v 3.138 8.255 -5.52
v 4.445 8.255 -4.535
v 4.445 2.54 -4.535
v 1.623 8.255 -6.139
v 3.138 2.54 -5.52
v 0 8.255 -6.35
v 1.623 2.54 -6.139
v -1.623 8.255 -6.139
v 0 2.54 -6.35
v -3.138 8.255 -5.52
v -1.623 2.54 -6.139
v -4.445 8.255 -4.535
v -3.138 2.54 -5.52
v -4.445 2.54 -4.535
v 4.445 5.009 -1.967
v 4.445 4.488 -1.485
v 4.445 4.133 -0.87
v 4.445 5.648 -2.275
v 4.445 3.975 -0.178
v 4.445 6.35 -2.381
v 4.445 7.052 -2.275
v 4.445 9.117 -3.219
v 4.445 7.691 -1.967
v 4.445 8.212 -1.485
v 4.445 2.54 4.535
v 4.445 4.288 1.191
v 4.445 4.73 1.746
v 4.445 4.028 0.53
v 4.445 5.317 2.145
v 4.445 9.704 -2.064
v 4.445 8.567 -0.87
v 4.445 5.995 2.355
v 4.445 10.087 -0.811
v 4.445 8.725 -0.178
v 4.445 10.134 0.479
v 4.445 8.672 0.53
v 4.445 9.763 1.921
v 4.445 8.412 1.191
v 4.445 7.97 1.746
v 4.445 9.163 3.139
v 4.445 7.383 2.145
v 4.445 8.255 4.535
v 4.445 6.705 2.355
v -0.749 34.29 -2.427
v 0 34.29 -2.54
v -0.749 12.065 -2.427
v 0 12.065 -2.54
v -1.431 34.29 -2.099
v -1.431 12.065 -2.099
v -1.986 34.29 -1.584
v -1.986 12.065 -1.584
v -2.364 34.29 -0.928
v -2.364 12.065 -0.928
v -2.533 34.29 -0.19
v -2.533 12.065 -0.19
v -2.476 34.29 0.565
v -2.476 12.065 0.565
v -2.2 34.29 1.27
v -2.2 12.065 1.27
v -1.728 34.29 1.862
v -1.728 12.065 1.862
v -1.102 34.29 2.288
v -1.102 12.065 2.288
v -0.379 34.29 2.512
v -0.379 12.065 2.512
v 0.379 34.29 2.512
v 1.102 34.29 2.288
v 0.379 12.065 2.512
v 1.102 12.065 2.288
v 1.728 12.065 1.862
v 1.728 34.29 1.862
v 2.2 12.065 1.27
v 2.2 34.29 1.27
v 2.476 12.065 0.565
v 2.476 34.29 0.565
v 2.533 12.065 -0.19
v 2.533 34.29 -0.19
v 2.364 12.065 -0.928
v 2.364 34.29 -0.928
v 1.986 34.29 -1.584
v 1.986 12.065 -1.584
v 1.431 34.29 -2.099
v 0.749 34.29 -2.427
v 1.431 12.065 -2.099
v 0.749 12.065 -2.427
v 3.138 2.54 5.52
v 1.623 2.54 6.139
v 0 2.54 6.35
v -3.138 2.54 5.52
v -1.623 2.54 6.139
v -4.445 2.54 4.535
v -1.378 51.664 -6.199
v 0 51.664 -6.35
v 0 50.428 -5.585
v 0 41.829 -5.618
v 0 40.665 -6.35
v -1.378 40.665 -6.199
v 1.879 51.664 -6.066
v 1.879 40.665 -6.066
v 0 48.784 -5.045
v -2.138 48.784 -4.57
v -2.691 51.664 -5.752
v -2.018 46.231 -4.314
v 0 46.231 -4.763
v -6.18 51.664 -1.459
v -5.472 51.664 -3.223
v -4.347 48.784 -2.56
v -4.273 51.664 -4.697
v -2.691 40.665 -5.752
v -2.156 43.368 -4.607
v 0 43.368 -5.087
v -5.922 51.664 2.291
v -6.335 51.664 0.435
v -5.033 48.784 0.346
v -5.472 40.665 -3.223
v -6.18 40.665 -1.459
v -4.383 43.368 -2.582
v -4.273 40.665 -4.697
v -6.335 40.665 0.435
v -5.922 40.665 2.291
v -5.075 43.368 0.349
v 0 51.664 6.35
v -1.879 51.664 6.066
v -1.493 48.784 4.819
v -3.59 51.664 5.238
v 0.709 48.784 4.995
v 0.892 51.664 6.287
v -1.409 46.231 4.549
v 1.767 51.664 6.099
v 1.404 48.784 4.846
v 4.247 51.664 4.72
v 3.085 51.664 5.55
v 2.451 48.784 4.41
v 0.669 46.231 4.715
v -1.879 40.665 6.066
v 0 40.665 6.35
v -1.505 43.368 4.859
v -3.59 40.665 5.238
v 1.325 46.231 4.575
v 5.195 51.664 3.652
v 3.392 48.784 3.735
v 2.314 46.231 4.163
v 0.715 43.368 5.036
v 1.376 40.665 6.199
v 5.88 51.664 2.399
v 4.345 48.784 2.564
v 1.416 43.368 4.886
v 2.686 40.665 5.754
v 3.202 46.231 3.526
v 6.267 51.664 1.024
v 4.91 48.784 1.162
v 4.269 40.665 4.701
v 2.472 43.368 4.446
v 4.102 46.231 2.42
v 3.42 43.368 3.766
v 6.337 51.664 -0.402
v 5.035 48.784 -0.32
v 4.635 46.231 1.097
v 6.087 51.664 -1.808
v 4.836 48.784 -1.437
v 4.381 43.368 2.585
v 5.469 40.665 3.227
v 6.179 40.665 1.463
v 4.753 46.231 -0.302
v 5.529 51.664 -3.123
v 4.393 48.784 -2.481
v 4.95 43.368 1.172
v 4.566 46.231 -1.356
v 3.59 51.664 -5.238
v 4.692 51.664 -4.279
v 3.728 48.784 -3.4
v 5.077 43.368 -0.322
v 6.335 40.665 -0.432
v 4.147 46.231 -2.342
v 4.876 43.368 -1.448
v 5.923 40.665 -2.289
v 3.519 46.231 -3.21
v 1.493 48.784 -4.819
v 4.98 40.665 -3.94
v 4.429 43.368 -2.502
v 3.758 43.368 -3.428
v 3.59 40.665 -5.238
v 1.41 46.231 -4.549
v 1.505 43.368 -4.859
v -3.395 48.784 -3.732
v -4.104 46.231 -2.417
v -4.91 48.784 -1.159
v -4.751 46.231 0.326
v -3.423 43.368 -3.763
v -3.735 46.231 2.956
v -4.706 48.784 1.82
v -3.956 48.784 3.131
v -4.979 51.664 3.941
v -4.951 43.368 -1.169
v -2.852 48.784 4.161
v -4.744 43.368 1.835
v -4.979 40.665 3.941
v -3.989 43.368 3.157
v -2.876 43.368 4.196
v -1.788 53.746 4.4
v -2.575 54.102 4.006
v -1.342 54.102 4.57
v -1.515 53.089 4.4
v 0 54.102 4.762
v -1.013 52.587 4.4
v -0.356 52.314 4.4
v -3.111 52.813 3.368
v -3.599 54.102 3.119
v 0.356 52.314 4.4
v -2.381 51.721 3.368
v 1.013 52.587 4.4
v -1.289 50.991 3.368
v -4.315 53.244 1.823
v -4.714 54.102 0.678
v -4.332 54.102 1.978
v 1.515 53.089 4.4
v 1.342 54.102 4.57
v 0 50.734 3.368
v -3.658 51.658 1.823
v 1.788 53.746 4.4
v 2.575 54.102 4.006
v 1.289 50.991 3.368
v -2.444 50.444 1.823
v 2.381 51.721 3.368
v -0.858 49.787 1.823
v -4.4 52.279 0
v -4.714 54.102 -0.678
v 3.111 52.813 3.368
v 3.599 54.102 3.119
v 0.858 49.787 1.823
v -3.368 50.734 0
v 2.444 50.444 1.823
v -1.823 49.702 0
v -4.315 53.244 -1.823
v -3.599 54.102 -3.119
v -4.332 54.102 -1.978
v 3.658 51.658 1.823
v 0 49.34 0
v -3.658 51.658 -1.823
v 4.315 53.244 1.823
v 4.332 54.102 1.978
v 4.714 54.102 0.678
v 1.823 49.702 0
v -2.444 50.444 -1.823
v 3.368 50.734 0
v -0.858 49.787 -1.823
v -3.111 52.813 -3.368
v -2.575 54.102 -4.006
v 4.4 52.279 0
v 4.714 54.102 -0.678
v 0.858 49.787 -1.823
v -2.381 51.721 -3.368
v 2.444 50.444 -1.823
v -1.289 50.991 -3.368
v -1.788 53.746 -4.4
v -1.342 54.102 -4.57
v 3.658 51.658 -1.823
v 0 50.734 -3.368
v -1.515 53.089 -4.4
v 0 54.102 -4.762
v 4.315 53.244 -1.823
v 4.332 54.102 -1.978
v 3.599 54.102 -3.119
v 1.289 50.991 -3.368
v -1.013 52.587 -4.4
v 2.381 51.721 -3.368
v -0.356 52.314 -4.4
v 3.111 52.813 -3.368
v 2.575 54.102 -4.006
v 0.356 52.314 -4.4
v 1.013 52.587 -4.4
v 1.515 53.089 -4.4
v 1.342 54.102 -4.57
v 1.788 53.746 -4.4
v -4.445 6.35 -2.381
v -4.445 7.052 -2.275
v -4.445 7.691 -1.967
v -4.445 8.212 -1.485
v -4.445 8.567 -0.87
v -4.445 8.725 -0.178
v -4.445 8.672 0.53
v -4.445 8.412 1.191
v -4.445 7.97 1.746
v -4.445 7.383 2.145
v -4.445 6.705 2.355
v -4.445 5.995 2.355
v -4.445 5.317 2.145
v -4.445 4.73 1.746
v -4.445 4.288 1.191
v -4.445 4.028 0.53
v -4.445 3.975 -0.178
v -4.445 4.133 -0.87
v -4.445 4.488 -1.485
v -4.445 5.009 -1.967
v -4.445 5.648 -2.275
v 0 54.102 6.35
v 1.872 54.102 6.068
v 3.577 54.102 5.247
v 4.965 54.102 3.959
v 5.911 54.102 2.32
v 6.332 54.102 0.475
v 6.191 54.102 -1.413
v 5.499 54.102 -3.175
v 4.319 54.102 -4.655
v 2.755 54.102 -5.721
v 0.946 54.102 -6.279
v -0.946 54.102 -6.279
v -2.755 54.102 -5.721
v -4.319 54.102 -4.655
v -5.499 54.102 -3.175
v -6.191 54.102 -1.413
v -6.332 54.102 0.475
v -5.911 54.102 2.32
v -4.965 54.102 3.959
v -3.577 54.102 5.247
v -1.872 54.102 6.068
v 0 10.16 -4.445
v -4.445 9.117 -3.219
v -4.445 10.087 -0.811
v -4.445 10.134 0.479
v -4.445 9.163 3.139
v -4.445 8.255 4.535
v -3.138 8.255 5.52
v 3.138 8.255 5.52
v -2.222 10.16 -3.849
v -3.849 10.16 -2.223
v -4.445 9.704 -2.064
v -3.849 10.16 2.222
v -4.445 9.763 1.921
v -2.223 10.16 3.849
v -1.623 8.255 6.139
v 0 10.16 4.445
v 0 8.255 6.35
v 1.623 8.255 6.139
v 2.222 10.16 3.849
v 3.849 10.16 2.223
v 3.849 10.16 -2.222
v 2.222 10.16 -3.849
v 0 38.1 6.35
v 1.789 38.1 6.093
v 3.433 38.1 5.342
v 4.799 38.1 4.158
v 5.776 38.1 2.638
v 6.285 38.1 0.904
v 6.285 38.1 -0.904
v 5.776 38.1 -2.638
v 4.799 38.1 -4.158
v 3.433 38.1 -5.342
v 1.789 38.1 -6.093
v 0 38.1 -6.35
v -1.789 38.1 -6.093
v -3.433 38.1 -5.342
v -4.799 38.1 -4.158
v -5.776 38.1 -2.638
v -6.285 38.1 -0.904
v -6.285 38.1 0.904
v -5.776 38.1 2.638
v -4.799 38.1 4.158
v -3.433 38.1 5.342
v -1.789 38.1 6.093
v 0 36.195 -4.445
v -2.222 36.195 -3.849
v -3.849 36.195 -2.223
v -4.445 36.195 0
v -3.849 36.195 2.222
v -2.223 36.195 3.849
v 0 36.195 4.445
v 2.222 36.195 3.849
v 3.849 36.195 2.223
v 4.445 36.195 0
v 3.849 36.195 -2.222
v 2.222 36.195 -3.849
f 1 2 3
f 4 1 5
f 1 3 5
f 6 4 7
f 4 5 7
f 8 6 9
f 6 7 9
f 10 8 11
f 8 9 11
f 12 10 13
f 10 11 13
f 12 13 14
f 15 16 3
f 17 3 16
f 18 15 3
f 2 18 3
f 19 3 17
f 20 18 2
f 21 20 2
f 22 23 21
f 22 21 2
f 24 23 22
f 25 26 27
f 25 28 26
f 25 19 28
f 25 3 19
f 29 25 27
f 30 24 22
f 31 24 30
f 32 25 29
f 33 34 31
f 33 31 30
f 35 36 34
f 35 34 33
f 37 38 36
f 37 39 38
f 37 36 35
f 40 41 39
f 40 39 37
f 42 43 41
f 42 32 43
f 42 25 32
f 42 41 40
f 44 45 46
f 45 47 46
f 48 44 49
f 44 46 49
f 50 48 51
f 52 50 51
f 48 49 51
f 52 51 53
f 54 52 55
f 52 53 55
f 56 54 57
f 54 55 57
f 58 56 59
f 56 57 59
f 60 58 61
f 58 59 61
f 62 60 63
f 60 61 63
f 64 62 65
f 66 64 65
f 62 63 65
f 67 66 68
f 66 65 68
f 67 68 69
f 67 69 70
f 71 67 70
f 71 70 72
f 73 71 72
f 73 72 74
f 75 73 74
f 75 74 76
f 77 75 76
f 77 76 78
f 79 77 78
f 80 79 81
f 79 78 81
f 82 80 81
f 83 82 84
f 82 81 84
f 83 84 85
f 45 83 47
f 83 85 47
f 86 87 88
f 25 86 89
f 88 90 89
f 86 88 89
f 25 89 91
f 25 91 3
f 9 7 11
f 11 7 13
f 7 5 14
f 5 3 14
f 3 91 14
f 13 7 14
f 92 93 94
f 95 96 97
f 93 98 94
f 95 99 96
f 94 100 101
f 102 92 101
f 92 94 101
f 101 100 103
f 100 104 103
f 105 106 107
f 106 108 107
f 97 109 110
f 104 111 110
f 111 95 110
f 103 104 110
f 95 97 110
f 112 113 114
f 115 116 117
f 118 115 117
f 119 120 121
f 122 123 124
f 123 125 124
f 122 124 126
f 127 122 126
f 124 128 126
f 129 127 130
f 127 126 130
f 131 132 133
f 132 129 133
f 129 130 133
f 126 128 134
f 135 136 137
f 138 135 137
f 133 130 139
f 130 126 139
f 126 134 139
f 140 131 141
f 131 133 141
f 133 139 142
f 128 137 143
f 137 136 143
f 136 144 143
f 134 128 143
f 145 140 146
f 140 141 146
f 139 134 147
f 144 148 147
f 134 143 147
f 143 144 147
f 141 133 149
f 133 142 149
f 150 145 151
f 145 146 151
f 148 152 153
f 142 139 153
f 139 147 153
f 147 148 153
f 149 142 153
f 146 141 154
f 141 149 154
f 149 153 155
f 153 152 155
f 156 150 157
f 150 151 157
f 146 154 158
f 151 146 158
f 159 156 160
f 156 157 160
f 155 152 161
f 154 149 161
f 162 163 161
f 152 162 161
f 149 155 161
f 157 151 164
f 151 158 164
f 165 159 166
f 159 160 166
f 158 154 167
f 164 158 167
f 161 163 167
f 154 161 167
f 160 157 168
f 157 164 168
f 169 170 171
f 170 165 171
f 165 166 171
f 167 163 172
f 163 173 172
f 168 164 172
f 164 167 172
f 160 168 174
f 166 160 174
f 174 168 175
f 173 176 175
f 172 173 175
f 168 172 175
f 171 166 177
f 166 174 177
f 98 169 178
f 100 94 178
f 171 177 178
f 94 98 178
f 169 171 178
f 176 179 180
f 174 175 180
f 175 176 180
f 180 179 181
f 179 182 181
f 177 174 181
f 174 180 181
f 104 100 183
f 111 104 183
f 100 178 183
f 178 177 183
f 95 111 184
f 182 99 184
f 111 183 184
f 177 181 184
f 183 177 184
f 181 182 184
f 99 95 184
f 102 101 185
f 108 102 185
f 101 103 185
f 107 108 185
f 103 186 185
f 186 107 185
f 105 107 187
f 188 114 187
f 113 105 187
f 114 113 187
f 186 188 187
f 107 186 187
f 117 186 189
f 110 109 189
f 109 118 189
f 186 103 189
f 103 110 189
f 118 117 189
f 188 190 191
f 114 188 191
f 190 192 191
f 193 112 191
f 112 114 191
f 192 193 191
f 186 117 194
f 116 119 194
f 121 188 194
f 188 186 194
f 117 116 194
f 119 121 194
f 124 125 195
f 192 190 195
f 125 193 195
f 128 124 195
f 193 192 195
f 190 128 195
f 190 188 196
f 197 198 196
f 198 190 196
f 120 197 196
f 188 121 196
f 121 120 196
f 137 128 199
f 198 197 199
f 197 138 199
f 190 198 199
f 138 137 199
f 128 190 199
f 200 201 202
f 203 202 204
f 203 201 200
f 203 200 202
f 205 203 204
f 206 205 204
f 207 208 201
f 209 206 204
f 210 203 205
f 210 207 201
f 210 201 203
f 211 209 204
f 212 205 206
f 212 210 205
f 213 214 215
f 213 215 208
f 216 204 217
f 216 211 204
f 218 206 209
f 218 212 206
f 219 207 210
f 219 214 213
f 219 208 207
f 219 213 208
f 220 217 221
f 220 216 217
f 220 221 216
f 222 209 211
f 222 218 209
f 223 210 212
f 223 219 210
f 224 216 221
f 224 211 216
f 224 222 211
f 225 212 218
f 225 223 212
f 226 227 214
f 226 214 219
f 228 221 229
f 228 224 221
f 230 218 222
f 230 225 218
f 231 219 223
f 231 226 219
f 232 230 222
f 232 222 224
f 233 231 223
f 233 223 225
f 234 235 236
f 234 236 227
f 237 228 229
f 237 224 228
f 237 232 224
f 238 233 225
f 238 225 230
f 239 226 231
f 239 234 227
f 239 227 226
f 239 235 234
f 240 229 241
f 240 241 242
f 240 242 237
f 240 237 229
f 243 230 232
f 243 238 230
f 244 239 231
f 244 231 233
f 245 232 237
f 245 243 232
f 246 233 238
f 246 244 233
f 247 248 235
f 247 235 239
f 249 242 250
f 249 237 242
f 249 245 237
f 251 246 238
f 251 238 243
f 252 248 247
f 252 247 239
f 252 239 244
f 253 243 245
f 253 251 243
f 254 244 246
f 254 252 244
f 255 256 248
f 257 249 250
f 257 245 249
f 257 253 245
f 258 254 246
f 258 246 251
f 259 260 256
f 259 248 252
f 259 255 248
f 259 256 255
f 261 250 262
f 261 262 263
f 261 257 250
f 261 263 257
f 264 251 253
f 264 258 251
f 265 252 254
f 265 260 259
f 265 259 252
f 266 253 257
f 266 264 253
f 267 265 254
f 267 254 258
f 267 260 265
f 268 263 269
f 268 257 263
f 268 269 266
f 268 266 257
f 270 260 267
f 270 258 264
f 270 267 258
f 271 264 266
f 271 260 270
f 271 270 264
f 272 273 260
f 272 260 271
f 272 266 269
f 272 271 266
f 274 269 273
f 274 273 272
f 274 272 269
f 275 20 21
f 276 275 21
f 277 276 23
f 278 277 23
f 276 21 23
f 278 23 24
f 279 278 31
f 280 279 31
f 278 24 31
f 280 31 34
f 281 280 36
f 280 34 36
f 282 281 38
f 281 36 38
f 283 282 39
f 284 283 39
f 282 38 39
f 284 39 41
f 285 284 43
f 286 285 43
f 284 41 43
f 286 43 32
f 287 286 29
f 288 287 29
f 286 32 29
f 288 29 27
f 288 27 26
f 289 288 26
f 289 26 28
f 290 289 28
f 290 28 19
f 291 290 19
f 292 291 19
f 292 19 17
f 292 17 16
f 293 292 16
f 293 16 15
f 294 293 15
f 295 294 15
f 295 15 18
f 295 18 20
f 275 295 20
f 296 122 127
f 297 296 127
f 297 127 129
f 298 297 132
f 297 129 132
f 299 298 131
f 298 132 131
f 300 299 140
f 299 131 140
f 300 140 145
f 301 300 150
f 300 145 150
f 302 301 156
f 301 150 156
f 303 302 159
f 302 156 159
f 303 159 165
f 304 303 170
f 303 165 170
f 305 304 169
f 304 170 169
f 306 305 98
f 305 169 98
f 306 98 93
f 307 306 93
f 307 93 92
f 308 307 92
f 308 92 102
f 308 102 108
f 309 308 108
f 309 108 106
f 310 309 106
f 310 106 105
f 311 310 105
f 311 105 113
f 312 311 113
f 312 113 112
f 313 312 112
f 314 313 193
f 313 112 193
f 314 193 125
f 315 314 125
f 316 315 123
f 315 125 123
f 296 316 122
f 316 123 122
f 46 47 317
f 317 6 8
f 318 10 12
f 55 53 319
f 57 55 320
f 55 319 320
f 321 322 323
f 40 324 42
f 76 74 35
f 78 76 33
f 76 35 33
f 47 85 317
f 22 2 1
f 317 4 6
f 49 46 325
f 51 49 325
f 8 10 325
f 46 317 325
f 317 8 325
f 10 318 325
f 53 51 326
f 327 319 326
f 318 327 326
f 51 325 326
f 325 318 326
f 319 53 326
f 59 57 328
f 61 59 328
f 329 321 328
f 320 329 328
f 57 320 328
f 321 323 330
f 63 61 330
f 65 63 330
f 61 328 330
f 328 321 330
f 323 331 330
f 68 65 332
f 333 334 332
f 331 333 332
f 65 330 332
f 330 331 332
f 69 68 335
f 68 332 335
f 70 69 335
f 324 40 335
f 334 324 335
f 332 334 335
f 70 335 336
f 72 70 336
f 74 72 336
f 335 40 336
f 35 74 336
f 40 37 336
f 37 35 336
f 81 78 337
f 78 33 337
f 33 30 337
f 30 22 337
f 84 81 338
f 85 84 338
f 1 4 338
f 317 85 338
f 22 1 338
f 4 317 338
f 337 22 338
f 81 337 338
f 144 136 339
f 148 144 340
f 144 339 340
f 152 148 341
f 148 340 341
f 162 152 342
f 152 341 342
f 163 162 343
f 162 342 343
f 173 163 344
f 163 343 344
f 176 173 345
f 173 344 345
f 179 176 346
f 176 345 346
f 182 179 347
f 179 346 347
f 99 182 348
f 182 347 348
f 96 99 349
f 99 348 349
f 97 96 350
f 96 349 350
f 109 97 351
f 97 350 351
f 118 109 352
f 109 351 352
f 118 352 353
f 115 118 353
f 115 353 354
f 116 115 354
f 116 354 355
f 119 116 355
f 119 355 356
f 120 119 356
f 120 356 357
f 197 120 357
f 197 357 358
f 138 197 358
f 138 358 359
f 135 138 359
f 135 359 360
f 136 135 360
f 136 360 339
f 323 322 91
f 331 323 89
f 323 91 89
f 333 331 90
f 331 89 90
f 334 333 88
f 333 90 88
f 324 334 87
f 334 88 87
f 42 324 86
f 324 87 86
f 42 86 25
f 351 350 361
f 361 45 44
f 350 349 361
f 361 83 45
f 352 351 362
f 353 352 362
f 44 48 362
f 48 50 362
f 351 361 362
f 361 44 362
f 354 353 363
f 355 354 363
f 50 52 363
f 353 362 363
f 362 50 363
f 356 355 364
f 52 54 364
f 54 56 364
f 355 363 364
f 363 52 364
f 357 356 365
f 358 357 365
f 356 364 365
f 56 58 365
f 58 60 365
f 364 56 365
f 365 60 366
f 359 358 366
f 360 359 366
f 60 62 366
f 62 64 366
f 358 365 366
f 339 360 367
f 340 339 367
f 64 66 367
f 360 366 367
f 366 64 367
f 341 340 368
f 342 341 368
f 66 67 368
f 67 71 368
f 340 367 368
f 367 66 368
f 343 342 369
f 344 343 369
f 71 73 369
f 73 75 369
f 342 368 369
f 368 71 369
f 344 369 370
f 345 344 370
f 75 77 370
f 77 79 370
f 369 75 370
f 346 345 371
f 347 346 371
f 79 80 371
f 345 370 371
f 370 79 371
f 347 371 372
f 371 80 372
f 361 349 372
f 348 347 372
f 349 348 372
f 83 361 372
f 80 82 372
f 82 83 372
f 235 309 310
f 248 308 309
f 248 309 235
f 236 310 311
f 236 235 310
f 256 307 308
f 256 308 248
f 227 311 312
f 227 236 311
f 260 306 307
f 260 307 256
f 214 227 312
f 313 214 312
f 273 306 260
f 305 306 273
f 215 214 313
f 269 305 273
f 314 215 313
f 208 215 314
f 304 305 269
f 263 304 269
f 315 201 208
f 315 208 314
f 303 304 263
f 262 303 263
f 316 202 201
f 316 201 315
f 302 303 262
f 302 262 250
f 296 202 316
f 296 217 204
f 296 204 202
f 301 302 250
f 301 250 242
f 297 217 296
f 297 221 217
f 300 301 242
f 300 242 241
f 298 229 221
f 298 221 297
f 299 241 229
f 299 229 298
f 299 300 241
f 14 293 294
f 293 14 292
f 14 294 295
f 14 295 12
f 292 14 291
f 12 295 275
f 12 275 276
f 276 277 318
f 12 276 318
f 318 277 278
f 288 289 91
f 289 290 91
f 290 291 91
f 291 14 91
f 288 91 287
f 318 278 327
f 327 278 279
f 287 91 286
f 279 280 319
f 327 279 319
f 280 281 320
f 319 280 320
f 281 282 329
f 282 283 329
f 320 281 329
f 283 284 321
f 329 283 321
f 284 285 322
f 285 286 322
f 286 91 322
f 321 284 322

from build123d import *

# Parameters (mm, degrees)
SKETCH1_R                      = 6.35
BOSS_EXTRUDE1_DEPTH            = 54.102
SKETCH3_W                      = 6.35
SKETCH3_H                      = 14.605
CUT_EXTRUDE1_DEPTH             = 55.842241056
F_3_16_0_1875_DIAMETER_HOLE1_D = 4.7625
SKETCH7_RX                     = 6.35
SKETCH7_RY                     = 3.175
CUT_EXTRUDE2_DEPTH             = 56.532701566
CUT_EXTRUDE2_DEPTH_BACK        = 56.532701566
SKETCH9_W                      = 25.4
SKETCH9_H                      = 12.7


with BuildPart() as part:
    # Sketch1 → Boss-Extrude1 (new body)
    with BuildSketch(Plane(origin=(0, 0, 0), x_dir=(1, 0, 0), z_dir=(0, 1, 0))):
        with Locations(Location((0, 0, 0), (0, 0, 270))):
            Circle(SKETCH1_R)
    extrude(amount=BOSS_EXTRUDE1_DEPTH)

    # Sketch2 → Cut-Revolve1 (revolve, cut)
    with BuildSketch(Plane.XY, mode=Mode.PRIVATE) as cut_revolve1_sk:
        Polygon((26.057124612, 38.1), (6.35, 38.1), (2.54, 34.29), (2.54, 12.065), (6.35, 8.255), (26.057124612, 8.255), align=None)
    revolve(cut_revolve1_sk.sketch.rotate(Axis((0, 0, 0), (0, 1, 0)), 90), axis=Axis((0, 0, 0), (0, 1, 0)), mode=Mode.SUBTRACT)

    # Sketch3 → Cut-Extrude1 (cut, symmetric)
    with BuildSketch(Plane.XY):
        with Locations((7.62, 7.3025)):
            Rectangle(SKETCH3_W, SKETCH3_H)
    cut_extrude1 = extrude(amount=CUT_EXTRUDE1_DEPTH, both=True, mode=Mode.SUBTRACT)

    # Mirror1: Cut-Extrude1 across plane
    add(cut_extrude1.mirror(Plane(origin=(0, 0, 0), x_dir=(0, 0, 1), z_dir=(1, 0, 0))), mode=Mode.SUBTRACT)

    # 3/16 (0.1875) Diameter Hole1 (through all)
    with Locations(Plane.ZY.offset(4.445)):
        with Locations((0, 6.35)):
            Hole(F_3_16_0_1875_DIAMETER_HOLE1_D / 2)

    # Sketch7 → Cut-Revolve2 (revolve, cut)
    with BuildSketch(Plane.XY, mode=Mode.PRIVATE) as cut_revolve2_sk:
        with Locations(Location((7.9375, 46.1645), (0, 0, -90))):
            Ellipse(SKETCH7_RX, SKETCH7_RY)
    revolve(cut_revolve2_sk.sketch.rotate(Axis((0, 0, 0), (0, 1, 0)), 90), axis=Axis((0, 0, 0), (0, 1, 0)), mode=Mode.SUBTRACT)

    # Sketch8 → Cut-Revolve3 (revolve, cut)
    with BuildSketch(Plane(origin=(0, 0, 0), x_dir=(0, 0, -1), z_dir=(1, 0, 0))):
        with BuildLine():
            Line((4.7625, 54.102), (-4.7625, 54.102))
            ThreePointArc((-4.7625, 54.102), (0, 49.3395), (4.7625, 54.102))
        make_face()
    revolve(axis=Axis((0, 54.102, -4.7625), (0, 0, 1)), mode=Mode.SUBTRACT)

    # Sketch9 → Cut-Extrude2 (cut, two sides: drawn at the far end of the back side and taken through both)
    with BuildSketch(Plane(origin=(4.445, 0, 0), x_dir=(0, 0, -1), z_dir=(1, 0, 0)).offset(-CUT_EXTRUDE2_DEPTH_BACK)):
        with Locations((1.492425813, -3.81)):
            Rectangle(SKETCH9_W, SKETCH9_H)
    extrude(amount=CUT_EXTRUDE2_DEPTH + CUT_EXTRUDE2_DEPTH_BACK, mode=Mode.SUBTRACT)


solid = part.part
